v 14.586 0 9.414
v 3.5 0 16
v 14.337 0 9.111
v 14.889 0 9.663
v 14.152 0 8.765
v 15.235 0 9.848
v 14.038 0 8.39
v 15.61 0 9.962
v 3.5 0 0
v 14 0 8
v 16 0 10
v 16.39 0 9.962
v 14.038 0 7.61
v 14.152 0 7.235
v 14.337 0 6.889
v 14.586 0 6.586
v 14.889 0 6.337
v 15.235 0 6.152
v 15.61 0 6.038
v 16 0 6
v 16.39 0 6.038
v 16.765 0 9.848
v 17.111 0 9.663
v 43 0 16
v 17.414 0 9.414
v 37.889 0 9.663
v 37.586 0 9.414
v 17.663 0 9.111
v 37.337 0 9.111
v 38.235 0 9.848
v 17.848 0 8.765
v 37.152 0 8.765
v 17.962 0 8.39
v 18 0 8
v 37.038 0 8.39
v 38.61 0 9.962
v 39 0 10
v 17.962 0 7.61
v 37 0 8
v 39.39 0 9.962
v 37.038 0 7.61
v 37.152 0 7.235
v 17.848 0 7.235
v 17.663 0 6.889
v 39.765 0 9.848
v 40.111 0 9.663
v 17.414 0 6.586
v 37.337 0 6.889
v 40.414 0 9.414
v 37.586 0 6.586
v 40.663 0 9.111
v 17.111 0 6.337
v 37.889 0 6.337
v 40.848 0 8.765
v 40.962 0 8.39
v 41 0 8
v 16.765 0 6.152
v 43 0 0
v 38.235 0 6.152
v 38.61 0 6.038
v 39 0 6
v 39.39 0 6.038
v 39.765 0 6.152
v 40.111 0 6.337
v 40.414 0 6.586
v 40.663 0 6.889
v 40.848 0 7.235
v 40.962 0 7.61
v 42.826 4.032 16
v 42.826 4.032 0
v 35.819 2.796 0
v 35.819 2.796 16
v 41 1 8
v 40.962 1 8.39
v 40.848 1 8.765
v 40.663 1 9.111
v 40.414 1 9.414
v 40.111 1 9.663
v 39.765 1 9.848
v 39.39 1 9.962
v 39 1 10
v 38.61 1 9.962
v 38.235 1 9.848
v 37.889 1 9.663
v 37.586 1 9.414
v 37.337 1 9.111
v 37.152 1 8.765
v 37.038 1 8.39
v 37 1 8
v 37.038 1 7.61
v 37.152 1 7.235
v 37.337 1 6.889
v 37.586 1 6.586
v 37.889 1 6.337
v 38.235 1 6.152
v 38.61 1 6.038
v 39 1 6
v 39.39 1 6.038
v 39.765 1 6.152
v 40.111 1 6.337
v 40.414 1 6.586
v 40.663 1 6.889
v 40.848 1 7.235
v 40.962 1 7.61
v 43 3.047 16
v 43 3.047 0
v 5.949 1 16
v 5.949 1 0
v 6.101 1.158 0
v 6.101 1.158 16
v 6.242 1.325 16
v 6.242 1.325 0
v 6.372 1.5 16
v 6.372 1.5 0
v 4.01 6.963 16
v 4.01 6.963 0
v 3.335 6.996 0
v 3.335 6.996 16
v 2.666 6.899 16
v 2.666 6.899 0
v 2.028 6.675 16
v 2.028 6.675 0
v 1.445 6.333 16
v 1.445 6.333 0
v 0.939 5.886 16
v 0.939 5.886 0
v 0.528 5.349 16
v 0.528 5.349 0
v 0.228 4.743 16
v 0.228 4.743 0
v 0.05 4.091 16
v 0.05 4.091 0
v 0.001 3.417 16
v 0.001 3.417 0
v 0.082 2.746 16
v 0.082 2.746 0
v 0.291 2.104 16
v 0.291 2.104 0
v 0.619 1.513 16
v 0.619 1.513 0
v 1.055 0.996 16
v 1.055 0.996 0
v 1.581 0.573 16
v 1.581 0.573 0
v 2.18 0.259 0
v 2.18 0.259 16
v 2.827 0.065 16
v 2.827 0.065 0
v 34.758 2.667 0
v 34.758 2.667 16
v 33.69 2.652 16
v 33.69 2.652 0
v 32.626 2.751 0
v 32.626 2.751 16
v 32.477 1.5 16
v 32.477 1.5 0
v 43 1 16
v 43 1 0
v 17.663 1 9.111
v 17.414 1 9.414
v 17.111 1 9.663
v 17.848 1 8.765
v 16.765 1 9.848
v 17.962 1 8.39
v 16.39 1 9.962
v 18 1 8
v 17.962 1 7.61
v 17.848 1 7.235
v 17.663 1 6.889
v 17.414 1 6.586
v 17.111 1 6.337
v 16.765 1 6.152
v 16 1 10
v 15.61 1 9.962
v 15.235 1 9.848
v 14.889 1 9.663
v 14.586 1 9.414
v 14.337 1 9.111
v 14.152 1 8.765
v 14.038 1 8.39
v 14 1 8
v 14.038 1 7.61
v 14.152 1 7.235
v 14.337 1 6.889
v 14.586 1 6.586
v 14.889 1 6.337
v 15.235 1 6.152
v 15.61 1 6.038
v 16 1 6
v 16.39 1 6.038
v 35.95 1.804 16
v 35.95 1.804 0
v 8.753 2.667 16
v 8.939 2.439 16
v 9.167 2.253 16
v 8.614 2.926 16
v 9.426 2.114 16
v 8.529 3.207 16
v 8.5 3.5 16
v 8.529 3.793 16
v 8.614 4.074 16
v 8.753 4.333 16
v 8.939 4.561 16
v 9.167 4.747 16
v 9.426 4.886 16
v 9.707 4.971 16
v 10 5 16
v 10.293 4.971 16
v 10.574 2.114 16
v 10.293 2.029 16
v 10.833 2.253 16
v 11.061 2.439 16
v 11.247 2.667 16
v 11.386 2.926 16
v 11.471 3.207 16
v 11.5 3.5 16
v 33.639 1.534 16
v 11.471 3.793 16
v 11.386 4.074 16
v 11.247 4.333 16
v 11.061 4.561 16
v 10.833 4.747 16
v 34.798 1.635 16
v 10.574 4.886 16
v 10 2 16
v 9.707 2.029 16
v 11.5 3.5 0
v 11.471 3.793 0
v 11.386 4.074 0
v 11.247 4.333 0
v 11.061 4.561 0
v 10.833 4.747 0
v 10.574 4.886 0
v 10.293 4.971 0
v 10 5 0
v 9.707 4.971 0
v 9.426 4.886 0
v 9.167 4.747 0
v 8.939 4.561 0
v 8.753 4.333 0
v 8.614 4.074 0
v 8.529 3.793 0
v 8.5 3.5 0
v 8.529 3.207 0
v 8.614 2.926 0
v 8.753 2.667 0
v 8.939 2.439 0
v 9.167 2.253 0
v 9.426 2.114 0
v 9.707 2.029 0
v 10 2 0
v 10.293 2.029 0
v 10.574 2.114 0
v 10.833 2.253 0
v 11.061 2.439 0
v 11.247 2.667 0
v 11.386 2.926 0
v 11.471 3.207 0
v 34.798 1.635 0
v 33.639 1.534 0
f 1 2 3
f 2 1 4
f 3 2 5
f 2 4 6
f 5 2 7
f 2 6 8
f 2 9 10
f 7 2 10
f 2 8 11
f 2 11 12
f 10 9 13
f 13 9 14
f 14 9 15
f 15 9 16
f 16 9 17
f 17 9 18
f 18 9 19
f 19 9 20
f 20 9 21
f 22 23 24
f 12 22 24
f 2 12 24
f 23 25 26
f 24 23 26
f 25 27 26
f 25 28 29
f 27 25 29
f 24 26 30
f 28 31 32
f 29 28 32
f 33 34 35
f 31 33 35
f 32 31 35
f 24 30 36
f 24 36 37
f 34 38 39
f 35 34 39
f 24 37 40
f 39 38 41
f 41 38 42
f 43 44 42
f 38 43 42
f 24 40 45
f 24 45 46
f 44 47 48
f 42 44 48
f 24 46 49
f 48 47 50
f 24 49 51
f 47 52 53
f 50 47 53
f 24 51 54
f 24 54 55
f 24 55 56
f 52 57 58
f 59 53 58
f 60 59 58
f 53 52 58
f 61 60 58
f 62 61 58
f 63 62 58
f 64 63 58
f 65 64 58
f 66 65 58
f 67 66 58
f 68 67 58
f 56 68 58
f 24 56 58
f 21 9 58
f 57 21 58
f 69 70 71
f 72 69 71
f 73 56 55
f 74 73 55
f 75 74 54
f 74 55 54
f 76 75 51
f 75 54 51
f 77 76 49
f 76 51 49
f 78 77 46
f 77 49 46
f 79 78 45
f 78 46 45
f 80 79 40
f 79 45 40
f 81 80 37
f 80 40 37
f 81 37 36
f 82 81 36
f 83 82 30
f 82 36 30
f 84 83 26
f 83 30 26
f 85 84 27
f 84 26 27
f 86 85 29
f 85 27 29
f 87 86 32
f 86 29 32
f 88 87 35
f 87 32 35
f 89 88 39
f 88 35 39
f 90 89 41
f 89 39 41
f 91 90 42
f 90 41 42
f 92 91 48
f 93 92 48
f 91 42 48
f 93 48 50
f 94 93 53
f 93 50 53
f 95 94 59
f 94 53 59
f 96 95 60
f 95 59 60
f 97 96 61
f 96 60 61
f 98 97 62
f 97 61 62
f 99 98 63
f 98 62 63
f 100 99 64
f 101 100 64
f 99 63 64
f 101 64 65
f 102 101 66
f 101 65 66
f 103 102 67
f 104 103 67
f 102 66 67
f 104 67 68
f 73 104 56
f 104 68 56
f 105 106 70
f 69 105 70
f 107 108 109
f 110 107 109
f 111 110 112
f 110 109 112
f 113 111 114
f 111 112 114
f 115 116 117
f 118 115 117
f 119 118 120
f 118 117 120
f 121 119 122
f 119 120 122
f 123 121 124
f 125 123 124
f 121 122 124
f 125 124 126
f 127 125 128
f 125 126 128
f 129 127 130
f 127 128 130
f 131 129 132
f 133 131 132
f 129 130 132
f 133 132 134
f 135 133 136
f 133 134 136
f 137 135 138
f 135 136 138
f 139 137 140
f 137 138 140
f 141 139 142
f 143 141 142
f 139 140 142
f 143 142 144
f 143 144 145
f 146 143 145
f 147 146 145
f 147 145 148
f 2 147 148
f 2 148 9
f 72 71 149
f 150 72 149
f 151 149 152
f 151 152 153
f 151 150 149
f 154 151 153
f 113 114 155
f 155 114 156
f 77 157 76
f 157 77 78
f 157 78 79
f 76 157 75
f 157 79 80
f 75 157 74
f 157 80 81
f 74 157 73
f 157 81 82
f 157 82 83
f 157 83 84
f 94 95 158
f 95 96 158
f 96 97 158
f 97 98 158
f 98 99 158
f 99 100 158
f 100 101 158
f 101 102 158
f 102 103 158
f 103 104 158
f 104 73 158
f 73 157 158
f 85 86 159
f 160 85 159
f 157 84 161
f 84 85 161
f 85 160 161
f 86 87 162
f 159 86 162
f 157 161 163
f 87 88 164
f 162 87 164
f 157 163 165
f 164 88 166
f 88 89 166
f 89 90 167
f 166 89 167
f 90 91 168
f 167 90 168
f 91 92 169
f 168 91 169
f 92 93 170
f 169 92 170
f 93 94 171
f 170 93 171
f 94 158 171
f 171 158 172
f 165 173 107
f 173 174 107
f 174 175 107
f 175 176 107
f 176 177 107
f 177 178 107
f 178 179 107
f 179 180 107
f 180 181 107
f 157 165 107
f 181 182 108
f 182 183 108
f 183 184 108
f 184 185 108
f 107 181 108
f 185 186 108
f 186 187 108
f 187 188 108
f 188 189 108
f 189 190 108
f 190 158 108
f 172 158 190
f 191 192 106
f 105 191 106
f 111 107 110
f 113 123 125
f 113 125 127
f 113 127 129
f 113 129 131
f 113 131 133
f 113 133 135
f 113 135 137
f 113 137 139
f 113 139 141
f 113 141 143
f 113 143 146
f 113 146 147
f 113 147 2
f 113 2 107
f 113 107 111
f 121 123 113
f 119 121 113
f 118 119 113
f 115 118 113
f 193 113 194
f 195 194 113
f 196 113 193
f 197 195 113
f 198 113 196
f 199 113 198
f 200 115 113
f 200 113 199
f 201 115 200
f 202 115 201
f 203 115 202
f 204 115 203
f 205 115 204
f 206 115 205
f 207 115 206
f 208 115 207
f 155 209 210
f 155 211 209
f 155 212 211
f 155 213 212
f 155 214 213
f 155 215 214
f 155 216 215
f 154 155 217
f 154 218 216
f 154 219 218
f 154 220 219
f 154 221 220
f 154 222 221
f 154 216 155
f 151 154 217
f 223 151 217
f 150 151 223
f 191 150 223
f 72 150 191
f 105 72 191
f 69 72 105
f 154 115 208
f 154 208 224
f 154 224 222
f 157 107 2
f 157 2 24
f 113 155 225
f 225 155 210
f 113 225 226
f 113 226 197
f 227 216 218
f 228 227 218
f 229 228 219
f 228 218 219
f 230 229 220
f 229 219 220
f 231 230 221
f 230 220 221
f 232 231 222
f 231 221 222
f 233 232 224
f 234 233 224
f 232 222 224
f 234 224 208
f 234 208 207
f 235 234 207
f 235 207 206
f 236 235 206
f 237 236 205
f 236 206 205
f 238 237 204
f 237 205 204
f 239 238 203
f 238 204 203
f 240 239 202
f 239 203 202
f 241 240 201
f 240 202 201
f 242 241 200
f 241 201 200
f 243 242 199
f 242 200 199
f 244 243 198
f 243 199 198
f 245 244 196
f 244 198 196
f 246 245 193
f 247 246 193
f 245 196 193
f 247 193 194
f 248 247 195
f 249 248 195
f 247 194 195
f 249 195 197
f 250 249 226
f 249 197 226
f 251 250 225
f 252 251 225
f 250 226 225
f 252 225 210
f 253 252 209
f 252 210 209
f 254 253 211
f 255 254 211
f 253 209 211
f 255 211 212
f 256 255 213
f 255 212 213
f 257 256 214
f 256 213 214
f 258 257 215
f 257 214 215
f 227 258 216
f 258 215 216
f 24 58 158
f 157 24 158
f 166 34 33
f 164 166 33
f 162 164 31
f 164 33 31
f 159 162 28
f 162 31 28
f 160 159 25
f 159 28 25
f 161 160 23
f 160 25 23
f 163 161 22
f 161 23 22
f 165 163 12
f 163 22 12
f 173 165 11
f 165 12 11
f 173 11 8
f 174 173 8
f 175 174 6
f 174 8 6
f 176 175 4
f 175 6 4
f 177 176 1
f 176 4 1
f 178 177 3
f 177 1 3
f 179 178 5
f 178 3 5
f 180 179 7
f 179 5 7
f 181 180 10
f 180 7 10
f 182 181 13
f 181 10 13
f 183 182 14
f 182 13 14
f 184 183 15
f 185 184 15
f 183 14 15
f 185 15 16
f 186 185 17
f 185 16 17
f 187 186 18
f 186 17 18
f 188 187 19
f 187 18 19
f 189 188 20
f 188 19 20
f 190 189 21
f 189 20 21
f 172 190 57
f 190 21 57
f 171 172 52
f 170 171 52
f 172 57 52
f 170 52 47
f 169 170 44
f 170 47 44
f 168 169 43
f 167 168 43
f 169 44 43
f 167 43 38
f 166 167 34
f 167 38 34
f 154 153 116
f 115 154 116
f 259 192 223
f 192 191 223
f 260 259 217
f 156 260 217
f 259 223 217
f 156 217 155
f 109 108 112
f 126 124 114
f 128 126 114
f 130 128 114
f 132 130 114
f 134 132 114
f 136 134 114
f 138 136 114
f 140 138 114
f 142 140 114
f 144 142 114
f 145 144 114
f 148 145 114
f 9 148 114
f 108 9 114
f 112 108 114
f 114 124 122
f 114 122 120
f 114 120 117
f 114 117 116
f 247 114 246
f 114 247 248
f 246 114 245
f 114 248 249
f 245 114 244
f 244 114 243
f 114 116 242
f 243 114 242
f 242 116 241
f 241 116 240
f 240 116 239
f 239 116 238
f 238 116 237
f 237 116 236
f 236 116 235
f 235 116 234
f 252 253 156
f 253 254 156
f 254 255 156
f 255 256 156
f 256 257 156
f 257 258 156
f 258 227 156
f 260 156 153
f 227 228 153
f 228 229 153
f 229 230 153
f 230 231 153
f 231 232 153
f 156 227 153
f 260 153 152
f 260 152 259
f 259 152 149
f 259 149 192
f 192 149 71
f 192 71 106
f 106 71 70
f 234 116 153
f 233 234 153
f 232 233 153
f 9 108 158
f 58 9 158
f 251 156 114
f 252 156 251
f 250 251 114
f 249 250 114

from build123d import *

# Parameters (mm, degrees)
ESTRUSIONE_ESTRUSIONE1_DEPTH = 16
RACCORDO1_R                  = 10
RACCORDO2_R                  = 20
SCHIZZO3_R                   = 1.5
TAGLIO_ESTRUSIONE1_DEPTH     = 16
SCHIZZO4_R                   = 2
TAGLIO_ESTRUSIONE2_DEPTH     = 1


with BuildPart() as part:
    # Schizzo1 → Estrusione-Estrusione1 (new body)
    with BuildSketch(Plane.XY):
        with BuildLine():
            Line((3.5, 0), (43, 0))
            Line((43, 0), (43, 1))
            Line((43, 1), (5.949489743, 1))
            ThreePointArc((5.949489743, 1), (6.17260394, 1.240091112), (6.372281323, 1.5))
            Line((6.372281323, 1.5), (34.226351822, 1.5))
            Line((34.226351822, 1.5), (43, 3.047030893))
            Line((43, 3.047030893), (42.826351822, 4.031838646))
            Line((42.826351822, 4.031838646), (34.226351822, 2.515426612))
            Line((34.226351822, 2.515426612), (4.009636789, 6.962696975))
            ThreePointArc((4.009636789, 6.962696975), (0.009338214, 3.755500085), (3.5, 0))
        make_face()
    extrude(amount=ESTRUSIONE_ESTRUSIONE1_DEPTH)

    # Raccordo1
    raccordo1_edges = [part.edges().sort_by_distance(p)[0] for p in [
        (34.226351822, 2.515426612, 8),
    ]]
    fillet(raccordo1_edges, radius=RACCORDO1_R)

    # Raccordo2
    raccordo2_edges = [part.edges().sort_by_distance(p)[0] for p in [
        (34.226351822, 1.5, 8),
    ]]
    fillet(raccordo2_edges, radius=RACCORDO2_R)

    # Schizzo3 → Taglio-Estrusione1 (cut)
    with BuildSketch(Plane.XY.offset(16)):
        with Locations((10, 3.5)):
            Circle(SCHIZZO3_R)
    extrude(amount=-TAGLIO_ESTRUSIONE1_DEPTH, mode=Mode.SUBTRACT)

    # Schizzo4 → Taglio-Estrusione2 (cut)
    with BuildSketch(Plane.XZ):
        with Locations((39, 8)):
            Circle(SCHIZZO4_R)
        with Locations((16, 8)):
            Circle(SCHIZZO4_R)
    extrude(amount=-TAGLIO_ESTRUSIONE2_DEPTH, mode=Mode.SUBTRACT)


solid = part.part
